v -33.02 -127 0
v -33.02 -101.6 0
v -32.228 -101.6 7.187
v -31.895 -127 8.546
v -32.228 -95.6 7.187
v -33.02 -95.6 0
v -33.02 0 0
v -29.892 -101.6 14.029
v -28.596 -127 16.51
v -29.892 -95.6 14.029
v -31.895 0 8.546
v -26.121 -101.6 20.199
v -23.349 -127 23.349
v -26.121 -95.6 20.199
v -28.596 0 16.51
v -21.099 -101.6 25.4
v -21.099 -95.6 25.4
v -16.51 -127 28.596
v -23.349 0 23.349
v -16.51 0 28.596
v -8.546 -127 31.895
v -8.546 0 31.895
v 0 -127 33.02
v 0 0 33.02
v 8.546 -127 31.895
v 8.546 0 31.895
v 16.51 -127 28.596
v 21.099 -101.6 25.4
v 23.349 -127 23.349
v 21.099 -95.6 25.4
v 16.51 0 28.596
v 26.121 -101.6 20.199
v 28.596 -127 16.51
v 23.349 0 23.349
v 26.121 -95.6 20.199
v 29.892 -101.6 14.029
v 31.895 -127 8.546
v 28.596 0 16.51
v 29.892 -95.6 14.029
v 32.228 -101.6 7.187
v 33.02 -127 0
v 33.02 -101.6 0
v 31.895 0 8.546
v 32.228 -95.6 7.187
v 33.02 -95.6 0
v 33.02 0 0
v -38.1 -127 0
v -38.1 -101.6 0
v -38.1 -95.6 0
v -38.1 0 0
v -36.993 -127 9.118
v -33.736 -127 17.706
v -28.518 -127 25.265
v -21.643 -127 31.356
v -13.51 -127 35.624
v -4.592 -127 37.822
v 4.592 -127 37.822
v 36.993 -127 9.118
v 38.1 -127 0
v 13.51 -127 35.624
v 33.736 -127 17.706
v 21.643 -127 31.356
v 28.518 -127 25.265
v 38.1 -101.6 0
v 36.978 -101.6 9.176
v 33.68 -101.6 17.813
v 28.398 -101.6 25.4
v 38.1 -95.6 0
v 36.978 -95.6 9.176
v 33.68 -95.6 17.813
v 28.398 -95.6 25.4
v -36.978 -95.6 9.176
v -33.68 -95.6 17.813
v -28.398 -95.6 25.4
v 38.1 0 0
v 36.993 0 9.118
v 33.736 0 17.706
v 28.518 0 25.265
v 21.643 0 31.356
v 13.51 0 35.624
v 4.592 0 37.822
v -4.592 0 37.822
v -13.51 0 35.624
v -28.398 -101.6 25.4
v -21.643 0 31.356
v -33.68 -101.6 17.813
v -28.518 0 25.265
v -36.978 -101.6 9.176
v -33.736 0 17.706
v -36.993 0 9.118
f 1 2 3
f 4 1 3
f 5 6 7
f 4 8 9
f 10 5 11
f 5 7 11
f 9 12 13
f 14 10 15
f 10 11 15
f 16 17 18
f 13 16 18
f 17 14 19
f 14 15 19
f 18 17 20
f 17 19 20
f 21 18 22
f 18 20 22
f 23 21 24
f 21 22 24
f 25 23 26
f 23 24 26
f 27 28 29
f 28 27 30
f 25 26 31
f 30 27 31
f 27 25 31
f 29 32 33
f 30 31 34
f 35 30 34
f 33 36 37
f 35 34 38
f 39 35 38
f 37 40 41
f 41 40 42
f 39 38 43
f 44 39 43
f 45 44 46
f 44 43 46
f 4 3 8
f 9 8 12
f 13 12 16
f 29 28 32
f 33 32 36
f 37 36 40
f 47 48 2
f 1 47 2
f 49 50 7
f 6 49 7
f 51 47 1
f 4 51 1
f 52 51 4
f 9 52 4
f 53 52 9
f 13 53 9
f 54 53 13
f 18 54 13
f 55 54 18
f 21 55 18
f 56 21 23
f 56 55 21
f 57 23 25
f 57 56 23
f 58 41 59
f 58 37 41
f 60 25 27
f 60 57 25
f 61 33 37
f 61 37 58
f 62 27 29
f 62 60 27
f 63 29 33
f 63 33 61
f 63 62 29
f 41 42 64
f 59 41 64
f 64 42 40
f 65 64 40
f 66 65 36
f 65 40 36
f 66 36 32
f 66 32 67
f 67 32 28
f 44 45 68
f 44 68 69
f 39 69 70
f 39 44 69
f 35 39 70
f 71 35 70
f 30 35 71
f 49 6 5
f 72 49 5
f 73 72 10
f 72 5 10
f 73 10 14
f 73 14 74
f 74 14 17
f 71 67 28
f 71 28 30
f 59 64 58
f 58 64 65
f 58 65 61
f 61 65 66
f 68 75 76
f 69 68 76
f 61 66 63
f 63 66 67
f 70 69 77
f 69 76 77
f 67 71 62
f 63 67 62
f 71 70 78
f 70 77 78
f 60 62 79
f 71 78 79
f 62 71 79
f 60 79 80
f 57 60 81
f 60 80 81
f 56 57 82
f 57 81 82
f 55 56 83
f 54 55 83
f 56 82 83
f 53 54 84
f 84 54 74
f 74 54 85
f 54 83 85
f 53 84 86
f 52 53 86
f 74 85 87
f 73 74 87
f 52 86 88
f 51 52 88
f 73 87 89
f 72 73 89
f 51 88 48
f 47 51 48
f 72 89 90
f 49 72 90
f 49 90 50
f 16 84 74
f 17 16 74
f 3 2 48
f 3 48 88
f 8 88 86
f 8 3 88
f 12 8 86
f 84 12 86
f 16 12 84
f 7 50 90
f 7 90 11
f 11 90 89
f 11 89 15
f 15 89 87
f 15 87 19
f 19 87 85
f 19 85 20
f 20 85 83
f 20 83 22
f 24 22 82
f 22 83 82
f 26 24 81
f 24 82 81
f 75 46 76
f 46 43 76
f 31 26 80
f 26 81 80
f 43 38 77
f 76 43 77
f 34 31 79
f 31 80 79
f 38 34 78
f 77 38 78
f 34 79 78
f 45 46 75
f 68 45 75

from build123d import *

# Parameters (mm, degrees)
F1_DEPTH = 127
F2_W     = 6
F2_H     = 25.4
F3_DEPTH = 101.6
F4_DEPTH = 101.6


with BuildPart() as f1:
    # F0 (on Front) → F1 (new body)
    with BuildSketch(Plane.XZ):
        with BuildLine():
            Line((33.02, 0), (38.1, 0))
            ThreePointArc((38.1, 0), (0, 38.1), (-38.1, 0))
            Line((-38.1, 0), (-33.02, 0))
            ThreePointArc((-33.02, 0), (0, 33.02), (33.02, 0))
        make_face()
    extrude(amount=F1_DEPTH)

    # F2 (on Right) → F3 (cut)
    with BuildSketch(Plane.YZ):
        with Locations((-98.6, 12.7)):
            Rectangle(F2_W, F2_H)
    extrude(amount=-F3_DEPTH, mode=Mode.SUBTRACT)

    # F2 (on Right) → F4 (cut)
    with BuildSketch(Plane.YZ):
        with Locations((-98.6, 12.7)):
            Rectangle(F2_W, F2_H)
    extrude(amount=F4_DEPTH, mode=Mode.SUBTRACT)


solid = f1.part
